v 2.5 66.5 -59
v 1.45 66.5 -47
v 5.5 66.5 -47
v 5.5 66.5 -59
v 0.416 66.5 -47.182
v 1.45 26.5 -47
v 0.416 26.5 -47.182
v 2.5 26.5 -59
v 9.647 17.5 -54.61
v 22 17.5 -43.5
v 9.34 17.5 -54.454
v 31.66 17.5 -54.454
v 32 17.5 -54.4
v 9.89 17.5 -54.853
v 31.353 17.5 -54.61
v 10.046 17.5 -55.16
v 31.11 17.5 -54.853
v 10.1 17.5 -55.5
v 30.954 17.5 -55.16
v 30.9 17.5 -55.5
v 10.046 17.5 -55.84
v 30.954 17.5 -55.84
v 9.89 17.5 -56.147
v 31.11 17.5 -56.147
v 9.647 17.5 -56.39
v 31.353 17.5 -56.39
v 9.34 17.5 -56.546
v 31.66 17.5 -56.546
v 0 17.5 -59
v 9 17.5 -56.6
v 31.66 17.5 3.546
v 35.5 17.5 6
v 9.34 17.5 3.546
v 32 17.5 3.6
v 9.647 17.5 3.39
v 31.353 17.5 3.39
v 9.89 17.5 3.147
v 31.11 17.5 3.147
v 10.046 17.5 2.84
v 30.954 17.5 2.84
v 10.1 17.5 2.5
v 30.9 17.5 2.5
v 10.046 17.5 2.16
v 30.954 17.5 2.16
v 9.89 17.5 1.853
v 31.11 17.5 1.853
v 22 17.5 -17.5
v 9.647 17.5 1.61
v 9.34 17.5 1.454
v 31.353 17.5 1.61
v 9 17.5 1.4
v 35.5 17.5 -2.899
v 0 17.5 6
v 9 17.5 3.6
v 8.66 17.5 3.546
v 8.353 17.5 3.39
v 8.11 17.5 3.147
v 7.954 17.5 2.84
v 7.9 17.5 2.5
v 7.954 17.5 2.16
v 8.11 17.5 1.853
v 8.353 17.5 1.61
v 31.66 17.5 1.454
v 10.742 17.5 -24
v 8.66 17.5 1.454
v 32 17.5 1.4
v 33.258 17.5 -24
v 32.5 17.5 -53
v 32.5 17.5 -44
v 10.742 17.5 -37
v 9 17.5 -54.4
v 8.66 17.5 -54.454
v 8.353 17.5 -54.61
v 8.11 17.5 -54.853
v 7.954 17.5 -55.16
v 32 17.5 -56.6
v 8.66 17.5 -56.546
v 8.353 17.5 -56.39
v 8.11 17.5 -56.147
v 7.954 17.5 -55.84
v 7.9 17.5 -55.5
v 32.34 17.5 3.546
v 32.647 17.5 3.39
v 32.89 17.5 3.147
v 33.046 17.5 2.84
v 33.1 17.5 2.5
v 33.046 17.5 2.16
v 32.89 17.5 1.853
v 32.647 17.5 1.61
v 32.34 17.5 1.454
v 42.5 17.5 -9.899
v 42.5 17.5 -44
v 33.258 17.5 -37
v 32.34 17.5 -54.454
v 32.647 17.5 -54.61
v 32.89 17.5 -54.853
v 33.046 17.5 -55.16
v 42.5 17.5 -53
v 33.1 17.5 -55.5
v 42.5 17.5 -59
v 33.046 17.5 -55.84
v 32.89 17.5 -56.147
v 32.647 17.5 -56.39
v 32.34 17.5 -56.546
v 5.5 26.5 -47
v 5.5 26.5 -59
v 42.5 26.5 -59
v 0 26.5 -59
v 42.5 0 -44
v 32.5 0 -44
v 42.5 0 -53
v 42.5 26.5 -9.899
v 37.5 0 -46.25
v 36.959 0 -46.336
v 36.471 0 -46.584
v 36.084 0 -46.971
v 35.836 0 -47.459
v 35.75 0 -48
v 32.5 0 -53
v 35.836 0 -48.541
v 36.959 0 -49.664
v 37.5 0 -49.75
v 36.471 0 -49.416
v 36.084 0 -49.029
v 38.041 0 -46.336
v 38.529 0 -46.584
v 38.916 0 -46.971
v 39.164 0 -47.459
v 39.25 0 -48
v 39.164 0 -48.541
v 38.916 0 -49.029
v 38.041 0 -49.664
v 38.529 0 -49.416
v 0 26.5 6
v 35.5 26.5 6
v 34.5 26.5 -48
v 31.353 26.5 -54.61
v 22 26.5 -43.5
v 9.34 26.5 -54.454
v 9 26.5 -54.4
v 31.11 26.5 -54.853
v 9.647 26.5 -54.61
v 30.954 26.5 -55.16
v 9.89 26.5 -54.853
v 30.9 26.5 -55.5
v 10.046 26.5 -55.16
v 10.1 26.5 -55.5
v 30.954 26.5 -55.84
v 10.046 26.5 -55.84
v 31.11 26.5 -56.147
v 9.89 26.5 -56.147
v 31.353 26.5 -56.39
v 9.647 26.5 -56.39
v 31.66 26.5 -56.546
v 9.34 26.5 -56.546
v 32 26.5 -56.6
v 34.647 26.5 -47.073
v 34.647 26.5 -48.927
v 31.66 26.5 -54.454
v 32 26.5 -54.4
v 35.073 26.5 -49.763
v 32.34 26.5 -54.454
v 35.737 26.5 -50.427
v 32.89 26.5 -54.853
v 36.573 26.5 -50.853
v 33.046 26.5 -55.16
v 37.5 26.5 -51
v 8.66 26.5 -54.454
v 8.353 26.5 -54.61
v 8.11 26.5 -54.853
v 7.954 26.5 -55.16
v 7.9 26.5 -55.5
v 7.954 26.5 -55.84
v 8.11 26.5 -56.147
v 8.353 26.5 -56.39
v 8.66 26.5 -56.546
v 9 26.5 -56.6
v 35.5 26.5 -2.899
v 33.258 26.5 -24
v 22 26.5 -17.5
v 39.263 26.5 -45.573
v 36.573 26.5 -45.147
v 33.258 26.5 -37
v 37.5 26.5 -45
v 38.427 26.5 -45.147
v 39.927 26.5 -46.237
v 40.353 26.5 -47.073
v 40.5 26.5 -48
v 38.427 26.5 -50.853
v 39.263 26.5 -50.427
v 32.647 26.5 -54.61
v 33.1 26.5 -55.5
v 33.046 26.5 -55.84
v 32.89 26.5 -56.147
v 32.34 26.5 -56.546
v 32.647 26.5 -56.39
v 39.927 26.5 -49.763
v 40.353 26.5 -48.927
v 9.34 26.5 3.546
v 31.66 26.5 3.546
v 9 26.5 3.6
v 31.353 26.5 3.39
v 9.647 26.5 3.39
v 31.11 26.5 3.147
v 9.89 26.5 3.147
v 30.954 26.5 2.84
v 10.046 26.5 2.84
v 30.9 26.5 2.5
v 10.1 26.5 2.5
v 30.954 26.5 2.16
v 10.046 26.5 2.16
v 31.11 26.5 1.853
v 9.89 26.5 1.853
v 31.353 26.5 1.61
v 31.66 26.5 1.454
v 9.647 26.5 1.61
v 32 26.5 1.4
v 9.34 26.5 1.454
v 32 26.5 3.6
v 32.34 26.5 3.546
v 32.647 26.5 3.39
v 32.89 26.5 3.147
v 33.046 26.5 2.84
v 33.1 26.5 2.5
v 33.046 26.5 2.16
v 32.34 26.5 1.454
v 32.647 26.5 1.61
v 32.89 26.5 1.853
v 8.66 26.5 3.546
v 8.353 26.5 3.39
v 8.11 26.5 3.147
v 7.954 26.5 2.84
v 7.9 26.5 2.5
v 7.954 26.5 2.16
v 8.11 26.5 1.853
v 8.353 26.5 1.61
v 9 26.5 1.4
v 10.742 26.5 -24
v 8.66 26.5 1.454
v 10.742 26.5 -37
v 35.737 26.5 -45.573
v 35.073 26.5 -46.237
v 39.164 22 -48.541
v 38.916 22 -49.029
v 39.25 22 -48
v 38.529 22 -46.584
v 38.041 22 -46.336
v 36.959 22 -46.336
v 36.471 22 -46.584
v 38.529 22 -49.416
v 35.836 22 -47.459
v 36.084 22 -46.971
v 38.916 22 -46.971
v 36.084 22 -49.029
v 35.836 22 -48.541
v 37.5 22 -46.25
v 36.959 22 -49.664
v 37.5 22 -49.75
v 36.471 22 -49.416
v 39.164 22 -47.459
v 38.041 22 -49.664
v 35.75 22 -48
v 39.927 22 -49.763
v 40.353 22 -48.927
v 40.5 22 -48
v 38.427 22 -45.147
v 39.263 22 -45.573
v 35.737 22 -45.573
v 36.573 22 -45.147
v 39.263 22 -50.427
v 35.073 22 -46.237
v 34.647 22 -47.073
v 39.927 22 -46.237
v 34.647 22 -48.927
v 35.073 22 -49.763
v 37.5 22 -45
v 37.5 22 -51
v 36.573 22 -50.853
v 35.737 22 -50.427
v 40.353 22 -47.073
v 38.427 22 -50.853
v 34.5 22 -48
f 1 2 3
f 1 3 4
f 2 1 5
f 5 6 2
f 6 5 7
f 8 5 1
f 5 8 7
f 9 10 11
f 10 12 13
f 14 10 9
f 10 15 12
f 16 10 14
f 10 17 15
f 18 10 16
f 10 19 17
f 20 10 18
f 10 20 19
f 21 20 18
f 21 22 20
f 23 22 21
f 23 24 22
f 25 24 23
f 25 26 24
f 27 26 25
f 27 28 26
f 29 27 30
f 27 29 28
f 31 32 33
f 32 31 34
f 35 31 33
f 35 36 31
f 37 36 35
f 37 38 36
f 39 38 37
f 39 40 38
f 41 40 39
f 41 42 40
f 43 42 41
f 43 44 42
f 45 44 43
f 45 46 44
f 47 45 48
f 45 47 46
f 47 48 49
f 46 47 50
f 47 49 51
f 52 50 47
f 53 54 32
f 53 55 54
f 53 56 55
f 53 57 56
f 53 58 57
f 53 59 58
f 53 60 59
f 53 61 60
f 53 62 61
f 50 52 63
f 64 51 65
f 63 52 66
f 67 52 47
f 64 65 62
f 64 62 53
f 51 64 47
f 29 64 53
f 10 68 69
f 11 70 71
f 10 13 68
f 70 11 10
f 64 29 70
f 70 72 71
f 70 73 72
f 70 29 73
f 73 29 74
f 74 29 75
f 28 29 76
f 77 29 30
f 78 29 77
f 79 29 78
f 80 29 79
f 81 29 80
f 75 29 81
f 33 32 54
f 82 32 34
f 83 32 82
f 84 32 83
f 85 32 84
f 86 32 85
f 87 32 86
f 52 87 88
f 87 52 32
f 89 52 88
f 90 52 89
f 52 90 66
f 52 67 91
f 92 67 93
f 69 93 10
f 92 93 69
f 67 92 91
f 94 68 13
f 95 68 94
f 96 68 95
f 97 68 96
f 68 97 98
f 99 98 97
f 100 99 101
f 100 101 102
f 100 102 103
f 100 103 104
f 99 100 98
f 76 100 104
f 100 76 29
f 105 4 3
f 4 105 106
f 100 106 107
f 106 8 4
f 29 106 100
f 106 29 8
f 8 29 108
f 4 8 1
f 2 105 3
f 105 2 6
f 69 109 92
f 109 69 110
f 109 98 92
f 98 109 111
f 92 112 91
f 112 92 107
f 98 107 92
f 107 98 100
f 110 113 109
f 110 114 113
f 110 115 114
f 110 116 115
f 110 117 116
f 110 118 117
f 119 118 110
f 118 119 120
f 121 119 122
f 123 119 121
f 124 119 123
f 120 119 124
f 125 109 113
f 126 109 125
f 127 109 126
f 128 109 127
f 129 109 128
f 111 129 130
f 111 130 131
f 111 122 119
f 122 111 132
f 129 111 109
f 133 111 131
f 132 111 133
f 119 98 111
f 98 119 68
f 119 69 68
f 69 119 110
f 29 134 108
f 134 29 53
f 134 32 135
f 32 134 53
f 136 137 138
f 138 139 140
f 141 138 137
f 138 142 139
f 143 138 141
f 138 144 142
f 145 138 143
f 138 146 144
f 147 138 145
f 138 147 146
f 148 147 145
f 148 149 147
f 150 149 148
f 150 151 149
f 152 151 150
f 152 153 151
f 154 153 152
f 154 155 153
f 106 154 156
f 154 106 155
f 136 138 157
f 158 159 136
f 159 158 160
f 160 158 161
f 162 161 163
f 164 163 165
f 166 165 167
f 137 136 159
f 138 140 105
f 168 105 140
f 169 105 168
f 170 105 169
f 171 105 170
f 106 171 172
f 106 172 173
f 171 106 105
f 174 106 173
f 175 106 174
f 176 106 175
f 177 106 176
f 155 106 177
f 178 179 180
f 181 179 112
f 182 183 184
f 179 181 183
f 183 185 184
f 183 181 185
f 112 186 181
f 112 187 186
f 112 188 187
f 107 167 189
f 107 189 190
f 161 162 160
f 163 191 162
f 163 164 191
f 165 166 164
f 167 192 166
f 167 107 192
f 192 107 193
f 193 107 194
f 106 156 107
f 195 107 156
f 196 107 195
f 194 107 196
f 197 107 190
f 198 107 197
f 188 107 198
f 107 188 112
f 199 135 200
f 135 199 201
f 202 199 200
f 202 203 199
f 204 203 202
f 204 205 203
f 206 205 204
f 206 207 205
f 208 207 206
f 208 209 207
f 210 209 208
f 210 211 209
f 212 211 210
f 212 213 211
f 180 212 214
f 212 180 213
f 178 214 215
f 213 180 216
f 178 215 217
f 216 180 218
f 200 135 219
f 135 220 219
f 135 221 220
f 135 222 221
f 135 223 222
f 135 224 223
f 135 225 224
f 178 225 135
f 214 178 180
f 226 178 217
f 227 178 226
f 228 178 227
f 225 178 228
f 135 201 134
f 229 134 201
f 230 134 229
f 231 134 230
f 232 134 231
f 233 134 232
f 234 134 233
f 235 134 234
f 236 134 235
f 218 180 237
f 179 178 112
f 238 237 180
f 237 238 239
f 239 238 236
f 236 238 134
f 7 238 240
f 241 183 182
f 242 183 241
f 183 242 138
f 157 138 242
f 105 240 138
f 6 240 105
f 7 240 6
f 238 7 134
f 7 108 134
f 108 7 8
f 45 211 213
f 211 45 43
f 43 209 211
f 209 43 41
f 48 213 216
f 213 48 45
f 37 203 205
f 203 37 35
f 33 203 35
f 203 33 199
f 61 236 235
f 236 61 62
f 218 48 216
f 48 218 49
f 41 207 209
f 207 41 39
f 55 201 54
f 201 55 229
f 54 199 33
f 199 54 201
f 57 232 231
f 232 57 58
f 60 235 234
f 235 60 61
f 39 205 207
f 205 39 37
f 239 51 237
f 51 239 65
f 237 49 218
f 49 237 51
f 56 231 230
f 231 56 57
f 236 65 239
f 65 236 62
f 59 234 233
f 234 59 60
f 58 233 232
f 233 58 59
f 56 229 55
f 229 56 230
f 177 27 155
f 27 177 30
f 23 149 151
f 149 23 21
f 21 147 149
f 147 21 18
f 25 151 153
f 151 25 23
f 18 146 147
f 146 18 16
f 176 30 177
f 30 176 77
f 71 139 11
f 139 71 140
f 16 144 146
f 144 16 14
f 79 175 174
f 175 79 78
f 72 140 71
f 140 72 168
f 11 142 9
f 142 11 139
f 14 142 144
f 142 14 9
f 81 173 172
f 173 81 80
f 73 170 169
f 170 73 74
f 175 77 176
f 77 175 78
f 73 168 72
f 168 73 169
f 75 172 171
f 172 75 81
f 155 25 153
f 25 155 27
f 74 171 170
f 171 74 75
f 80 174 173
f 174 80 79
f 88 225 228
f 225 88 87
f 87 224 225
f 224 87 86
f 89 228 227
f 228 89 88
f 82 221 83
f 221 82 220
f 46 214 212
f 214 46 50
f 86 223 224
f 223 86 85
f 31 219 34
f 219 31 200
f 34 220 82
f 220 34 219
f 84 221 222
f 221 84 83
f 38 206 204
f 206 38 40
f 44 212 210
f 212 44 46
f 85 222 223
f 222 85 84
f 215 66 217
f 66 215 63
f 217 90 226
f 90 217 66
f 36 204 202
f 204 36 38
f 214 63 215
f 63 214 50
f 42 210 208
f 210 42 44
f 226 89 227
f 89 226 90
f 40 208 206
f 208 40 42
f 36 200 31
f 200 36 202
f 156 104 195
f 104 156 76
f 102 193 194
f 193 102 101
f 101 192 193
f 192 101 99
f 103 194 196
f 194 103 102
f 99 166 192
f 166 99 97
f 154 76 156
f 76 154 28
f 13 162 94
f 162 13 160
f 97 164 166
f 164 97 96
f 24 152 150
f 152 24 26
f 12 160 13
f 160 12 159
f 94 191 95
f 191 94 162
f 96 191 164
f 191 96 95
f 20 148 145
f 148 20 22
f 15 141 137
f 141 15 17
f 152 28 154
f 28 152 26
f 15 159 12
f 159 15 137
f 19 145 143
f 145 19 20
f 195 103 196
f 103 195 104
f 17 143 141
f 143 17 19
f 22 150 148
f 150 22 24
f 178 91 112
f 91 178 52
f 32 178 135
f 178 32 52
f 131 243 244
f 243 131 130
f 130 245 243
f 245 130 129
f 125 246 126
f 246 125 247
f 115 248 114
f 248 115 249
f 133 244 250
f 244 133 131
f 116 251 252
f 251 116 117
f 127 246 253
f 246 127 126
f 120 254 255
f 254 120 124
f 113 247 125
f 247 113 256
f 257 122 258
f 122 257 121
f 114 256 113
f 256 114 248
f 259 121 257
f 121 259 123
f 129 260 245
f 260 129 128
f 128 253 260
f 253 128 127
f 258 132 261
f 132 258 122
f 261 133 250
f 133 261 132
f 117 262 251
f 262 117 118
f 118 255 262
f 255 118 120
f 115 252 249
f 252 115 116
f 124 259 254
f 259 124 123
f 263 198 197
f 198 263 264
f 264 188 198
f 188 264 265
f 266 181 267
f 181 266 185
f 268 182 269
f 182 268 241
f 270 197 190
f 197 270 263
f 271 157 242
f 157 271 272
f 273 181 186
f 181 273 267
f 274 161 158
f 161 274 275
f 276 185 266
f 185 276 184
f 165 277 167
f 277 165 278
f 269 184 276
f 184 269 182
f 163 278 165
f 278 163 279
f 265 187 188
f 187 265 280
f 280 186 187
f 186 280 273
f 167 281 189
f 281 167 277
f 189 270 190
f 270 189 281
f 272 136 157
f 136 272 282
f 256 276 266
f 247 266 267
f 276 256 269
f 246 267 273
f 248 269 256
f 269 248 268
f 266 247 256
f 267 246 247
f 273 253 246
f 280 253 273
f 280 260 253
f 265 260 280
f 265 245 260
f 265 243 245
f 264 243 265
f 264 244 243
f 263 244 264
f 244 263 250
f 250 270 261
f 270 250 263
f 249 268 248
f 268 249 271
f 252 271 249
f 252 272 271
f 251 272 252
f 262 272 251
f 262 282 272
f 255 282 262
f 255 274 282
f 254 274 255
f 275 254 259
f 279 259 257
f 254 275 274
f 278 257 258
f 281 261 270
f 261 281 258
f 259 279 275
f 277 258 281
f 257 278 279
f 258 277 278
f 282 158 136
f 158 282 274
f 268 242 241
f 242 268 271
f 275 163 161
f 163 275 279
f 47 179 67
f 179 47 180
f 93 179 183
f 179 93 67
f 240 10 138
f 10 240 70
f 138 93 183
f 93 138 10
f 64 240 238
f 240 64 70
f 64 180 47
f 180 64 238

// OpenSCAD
bottom_end = 53;
left_end = 42.5;
bot_thickness = 17.5;
screw_out = 22; // 15.2;
plateau_thick = 9;
motor_pos_z = 30.5;
motor_pos_x = 22;
raspi_h = 65; // Raspi Zero W dimension
raspi_w = 30;
raspi_hole_pos = 3.5; // From the side
raspi_hole_dia = 2.2; // Add some margin, too!
raspi_hole_nut_dia = 10.5;
camera_plat_y = 40;
camera_plat_w = 12; 
camera_space = 5.5;
wall = 3;

// Calculated
plateau_over = (raspi_h-bottom_end)/2;

$fn = 20;
sep = 0;

rotate([0,0,0]) {
    difference() {
        union() {
            // Vertical back
            //translate([left_end,0,-bottom_end]) mirror([1,0,0]) cube([9,bot_thickness,30]);
            // Horizontal back
            translate([left_end,sep,-bottom_end]) mirror([1,0,0]) cube([10,bot_thickness,9]);
            // Plateau
            translate([0,bot_thickness,plateau_over]) mirror([0,0,180]) cube([left_end,plateau_thick,raspi_h]);
            //translate([0,bot_thickness,0]) mirror([0,0,180]) cube([left_end,plateau_thick,raspi_h-2*plateau_over]);
            // Camera extension
            translate([camera_space-wall,bot_thickness,-raspi_h+plateau_over]) {
                y = camera_plat_y+plateau_thick;
                intersection() {
                    union() {
                        rotate([0,-10,0]) cube([wall,y,camera_plat_w]);
                        cube([wall,y,camera_plat_w*2]);
                    }
                    translate([-wall,0,0]) cube([2*wall,y,camera_plat_w]);
                }
            }
            
            // Add a support for the camera hand
            translate([0,bot_thickness,-raspi_h+plateau_over]) cube([camera_space,plateau_thick,camera_plat_w]);

        }
        // Hole for motor screw
        translate([left_end-5,-10,-bottom_end+5]) rotate([-90,0,0]) cylinder(100,3.5/2,3.5/2);

        // Screw insert
        translate([left_end-5,screw_out,-bottom_end+5]) rotate([-90,0,0]) cylinder(bot_thickness,3,3);
        
        // Hole for motor axis
        size = 13;
        translate([motor_pos_x,bot_thickness,-motor_pos_z]) rotate([-90,30,0]) cylinder(20, size, size, $fn =6);
        
        // Holes for raspi
        for (x = [raspi_hole_pos+camera_space,raspi_w-raspi_hole_pos+camera_space]) {
            for (z = [plateau_over-raspi_hole_pos,-raspi_h+plateau_over+raspi_hole_pos]) {
                translate([x,0,z]) rotate([-90,0,0]) {
                    #cylinder(plateau_thick+bot_thickness,raspi_hole_dia/2, raspi_hole_dia/2);
                    //#cylinder(plateau_thick+bot_thickness-3,raspi_hole_nut_dia/2, raspi_hole_nut_dia/2);
                }
            }
        }
        
        // Stylish cut on the left
        rounding = 14;
        difference() {
            translate([left_end,0,0]) rotate([0,45,0]) cube([100,100,rounding], center=true);
            // Add platform again
            translate([0,bot_thickness,plateau_over]) mirror([0,0,180]) cube([raspi_w+camera_space,plateau_thick,raspi_h]);

        }
    }
}
